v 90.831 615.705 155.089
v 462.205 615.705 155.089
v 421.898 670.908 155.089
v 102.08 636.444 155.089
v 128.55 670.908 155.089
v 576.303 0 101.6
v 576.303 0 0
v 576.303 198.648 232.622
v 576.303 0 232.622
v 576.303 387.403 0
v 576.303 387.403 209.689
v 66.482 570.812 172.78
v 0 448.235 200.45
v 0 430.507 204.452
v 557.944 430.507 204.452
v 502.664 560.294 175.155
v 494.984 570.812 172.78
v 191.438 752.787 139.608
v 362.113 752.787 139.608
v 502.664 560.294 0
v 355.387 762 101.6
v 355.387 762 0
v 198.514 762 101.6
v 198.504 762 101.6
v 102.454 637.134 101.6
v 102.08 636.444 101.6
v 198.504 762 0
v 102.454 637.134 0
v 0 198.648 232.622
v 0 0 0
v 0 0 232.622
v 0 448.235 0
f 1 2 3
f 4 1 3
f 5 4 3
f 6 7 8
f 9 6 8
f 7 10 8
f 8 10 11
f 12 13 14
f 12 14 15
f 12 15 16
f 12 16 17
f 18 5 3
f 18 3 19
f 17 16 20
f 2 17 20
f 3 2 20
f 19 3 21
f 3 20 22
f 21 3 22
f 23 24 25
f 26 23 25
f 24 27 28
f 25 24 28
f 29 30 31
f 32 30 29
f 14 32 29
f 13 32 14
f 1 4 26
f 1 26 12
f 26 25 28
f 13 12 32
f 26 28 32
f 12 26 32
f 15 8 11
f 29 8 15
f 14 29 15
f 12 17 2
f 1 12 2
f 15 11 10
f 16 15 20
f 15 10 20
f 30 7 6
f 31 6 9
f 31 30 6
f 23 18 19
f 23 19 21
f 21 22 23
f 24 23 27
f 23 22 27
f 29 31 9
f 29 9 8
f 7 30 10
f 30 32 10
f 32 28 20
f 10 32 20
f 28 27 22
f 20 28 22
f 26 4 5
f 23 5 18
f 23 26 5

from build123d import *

# Parameters (mm, degrees)
BOSS_EXTRUDE1_DEPTH = 101.6
BOSS_EXTRUDE2_DEPTH = 576.302521
CUT_EXTRUDE1_DEPTH  = 132.021743181
CUT_EXTRUDE2_DEPTH  = 132.021743181


with BuildPart() as part:
    # Sketch1 → Boss-Extrude1 (new body)
    with BuildSketch(Plane.XY):
        Polygon((0, 0), (576.302521008, 0), (576.302521008, 387.403361345), (502.663865546, 560.294117647), (355.386554622, 762), (198.504201681, 762), (102.453781513, 637.134453782), (0, 448.235294118), align=None)
    extrude(amount=BOSS_EXTRUDE1_DEPTH)

    # Sketch2 → Boss-Extrude2 (add)
    with BuildSketch(Plane.ZY):
        Polygon((101.6, 0), (232.621743181, 0), (232.621743181, 198.64821401), (204.451845393, 430.506603568), (172.780455352, 570.81191653), (155.089264466, 615.704741573), (155.089264466, 670.908278379), (139.607943989, 752.787376516), (101.6, 762), align=None)
    extrude(amount=-BOSS_EXTRUDE2_DEPTH)

    # Sketch3 → Cut-Extrude1 (cut, through all)
    with BuildSketch(Plane(origin=(0, 0, 101.6), x_dir=(-1, 0, 0), z_dir=(0, 0, -1))):
        Polygon((0, 448.235294118), (-102.079559314, 636.444481603), (-205.052343037, 770.512583763), (-205.052343037, 987.342816442), (227.879484492, 941.92173413), (179.71587047, 482.849418415), align=None)
    extrude(amount=-CUT_EXTRUDE1_DEPTH, mode=Mode.SUBTRACT)

    # Sketch4 → Cut-Extrude2 (cut, through all)
    with BuildSketch(Plane(origin=(0, 0, 101.6), x_dir=(-1, 0, 0), z_dir=(0, 0, -1))):
        Polygon((-576.302521008, 387.403361345), (-502.663865546, 560.294117647), (-355.386554622, 762), (-386.647779508, 961.526140846), (-935.090979015, 961.526140846), (-884.913915701, 472.949119069), align=None)
    extrude(amount=-CUT_EXTRUDE2_DEPTH, mode=Mode.SUBTRACT)


solid = part.part
